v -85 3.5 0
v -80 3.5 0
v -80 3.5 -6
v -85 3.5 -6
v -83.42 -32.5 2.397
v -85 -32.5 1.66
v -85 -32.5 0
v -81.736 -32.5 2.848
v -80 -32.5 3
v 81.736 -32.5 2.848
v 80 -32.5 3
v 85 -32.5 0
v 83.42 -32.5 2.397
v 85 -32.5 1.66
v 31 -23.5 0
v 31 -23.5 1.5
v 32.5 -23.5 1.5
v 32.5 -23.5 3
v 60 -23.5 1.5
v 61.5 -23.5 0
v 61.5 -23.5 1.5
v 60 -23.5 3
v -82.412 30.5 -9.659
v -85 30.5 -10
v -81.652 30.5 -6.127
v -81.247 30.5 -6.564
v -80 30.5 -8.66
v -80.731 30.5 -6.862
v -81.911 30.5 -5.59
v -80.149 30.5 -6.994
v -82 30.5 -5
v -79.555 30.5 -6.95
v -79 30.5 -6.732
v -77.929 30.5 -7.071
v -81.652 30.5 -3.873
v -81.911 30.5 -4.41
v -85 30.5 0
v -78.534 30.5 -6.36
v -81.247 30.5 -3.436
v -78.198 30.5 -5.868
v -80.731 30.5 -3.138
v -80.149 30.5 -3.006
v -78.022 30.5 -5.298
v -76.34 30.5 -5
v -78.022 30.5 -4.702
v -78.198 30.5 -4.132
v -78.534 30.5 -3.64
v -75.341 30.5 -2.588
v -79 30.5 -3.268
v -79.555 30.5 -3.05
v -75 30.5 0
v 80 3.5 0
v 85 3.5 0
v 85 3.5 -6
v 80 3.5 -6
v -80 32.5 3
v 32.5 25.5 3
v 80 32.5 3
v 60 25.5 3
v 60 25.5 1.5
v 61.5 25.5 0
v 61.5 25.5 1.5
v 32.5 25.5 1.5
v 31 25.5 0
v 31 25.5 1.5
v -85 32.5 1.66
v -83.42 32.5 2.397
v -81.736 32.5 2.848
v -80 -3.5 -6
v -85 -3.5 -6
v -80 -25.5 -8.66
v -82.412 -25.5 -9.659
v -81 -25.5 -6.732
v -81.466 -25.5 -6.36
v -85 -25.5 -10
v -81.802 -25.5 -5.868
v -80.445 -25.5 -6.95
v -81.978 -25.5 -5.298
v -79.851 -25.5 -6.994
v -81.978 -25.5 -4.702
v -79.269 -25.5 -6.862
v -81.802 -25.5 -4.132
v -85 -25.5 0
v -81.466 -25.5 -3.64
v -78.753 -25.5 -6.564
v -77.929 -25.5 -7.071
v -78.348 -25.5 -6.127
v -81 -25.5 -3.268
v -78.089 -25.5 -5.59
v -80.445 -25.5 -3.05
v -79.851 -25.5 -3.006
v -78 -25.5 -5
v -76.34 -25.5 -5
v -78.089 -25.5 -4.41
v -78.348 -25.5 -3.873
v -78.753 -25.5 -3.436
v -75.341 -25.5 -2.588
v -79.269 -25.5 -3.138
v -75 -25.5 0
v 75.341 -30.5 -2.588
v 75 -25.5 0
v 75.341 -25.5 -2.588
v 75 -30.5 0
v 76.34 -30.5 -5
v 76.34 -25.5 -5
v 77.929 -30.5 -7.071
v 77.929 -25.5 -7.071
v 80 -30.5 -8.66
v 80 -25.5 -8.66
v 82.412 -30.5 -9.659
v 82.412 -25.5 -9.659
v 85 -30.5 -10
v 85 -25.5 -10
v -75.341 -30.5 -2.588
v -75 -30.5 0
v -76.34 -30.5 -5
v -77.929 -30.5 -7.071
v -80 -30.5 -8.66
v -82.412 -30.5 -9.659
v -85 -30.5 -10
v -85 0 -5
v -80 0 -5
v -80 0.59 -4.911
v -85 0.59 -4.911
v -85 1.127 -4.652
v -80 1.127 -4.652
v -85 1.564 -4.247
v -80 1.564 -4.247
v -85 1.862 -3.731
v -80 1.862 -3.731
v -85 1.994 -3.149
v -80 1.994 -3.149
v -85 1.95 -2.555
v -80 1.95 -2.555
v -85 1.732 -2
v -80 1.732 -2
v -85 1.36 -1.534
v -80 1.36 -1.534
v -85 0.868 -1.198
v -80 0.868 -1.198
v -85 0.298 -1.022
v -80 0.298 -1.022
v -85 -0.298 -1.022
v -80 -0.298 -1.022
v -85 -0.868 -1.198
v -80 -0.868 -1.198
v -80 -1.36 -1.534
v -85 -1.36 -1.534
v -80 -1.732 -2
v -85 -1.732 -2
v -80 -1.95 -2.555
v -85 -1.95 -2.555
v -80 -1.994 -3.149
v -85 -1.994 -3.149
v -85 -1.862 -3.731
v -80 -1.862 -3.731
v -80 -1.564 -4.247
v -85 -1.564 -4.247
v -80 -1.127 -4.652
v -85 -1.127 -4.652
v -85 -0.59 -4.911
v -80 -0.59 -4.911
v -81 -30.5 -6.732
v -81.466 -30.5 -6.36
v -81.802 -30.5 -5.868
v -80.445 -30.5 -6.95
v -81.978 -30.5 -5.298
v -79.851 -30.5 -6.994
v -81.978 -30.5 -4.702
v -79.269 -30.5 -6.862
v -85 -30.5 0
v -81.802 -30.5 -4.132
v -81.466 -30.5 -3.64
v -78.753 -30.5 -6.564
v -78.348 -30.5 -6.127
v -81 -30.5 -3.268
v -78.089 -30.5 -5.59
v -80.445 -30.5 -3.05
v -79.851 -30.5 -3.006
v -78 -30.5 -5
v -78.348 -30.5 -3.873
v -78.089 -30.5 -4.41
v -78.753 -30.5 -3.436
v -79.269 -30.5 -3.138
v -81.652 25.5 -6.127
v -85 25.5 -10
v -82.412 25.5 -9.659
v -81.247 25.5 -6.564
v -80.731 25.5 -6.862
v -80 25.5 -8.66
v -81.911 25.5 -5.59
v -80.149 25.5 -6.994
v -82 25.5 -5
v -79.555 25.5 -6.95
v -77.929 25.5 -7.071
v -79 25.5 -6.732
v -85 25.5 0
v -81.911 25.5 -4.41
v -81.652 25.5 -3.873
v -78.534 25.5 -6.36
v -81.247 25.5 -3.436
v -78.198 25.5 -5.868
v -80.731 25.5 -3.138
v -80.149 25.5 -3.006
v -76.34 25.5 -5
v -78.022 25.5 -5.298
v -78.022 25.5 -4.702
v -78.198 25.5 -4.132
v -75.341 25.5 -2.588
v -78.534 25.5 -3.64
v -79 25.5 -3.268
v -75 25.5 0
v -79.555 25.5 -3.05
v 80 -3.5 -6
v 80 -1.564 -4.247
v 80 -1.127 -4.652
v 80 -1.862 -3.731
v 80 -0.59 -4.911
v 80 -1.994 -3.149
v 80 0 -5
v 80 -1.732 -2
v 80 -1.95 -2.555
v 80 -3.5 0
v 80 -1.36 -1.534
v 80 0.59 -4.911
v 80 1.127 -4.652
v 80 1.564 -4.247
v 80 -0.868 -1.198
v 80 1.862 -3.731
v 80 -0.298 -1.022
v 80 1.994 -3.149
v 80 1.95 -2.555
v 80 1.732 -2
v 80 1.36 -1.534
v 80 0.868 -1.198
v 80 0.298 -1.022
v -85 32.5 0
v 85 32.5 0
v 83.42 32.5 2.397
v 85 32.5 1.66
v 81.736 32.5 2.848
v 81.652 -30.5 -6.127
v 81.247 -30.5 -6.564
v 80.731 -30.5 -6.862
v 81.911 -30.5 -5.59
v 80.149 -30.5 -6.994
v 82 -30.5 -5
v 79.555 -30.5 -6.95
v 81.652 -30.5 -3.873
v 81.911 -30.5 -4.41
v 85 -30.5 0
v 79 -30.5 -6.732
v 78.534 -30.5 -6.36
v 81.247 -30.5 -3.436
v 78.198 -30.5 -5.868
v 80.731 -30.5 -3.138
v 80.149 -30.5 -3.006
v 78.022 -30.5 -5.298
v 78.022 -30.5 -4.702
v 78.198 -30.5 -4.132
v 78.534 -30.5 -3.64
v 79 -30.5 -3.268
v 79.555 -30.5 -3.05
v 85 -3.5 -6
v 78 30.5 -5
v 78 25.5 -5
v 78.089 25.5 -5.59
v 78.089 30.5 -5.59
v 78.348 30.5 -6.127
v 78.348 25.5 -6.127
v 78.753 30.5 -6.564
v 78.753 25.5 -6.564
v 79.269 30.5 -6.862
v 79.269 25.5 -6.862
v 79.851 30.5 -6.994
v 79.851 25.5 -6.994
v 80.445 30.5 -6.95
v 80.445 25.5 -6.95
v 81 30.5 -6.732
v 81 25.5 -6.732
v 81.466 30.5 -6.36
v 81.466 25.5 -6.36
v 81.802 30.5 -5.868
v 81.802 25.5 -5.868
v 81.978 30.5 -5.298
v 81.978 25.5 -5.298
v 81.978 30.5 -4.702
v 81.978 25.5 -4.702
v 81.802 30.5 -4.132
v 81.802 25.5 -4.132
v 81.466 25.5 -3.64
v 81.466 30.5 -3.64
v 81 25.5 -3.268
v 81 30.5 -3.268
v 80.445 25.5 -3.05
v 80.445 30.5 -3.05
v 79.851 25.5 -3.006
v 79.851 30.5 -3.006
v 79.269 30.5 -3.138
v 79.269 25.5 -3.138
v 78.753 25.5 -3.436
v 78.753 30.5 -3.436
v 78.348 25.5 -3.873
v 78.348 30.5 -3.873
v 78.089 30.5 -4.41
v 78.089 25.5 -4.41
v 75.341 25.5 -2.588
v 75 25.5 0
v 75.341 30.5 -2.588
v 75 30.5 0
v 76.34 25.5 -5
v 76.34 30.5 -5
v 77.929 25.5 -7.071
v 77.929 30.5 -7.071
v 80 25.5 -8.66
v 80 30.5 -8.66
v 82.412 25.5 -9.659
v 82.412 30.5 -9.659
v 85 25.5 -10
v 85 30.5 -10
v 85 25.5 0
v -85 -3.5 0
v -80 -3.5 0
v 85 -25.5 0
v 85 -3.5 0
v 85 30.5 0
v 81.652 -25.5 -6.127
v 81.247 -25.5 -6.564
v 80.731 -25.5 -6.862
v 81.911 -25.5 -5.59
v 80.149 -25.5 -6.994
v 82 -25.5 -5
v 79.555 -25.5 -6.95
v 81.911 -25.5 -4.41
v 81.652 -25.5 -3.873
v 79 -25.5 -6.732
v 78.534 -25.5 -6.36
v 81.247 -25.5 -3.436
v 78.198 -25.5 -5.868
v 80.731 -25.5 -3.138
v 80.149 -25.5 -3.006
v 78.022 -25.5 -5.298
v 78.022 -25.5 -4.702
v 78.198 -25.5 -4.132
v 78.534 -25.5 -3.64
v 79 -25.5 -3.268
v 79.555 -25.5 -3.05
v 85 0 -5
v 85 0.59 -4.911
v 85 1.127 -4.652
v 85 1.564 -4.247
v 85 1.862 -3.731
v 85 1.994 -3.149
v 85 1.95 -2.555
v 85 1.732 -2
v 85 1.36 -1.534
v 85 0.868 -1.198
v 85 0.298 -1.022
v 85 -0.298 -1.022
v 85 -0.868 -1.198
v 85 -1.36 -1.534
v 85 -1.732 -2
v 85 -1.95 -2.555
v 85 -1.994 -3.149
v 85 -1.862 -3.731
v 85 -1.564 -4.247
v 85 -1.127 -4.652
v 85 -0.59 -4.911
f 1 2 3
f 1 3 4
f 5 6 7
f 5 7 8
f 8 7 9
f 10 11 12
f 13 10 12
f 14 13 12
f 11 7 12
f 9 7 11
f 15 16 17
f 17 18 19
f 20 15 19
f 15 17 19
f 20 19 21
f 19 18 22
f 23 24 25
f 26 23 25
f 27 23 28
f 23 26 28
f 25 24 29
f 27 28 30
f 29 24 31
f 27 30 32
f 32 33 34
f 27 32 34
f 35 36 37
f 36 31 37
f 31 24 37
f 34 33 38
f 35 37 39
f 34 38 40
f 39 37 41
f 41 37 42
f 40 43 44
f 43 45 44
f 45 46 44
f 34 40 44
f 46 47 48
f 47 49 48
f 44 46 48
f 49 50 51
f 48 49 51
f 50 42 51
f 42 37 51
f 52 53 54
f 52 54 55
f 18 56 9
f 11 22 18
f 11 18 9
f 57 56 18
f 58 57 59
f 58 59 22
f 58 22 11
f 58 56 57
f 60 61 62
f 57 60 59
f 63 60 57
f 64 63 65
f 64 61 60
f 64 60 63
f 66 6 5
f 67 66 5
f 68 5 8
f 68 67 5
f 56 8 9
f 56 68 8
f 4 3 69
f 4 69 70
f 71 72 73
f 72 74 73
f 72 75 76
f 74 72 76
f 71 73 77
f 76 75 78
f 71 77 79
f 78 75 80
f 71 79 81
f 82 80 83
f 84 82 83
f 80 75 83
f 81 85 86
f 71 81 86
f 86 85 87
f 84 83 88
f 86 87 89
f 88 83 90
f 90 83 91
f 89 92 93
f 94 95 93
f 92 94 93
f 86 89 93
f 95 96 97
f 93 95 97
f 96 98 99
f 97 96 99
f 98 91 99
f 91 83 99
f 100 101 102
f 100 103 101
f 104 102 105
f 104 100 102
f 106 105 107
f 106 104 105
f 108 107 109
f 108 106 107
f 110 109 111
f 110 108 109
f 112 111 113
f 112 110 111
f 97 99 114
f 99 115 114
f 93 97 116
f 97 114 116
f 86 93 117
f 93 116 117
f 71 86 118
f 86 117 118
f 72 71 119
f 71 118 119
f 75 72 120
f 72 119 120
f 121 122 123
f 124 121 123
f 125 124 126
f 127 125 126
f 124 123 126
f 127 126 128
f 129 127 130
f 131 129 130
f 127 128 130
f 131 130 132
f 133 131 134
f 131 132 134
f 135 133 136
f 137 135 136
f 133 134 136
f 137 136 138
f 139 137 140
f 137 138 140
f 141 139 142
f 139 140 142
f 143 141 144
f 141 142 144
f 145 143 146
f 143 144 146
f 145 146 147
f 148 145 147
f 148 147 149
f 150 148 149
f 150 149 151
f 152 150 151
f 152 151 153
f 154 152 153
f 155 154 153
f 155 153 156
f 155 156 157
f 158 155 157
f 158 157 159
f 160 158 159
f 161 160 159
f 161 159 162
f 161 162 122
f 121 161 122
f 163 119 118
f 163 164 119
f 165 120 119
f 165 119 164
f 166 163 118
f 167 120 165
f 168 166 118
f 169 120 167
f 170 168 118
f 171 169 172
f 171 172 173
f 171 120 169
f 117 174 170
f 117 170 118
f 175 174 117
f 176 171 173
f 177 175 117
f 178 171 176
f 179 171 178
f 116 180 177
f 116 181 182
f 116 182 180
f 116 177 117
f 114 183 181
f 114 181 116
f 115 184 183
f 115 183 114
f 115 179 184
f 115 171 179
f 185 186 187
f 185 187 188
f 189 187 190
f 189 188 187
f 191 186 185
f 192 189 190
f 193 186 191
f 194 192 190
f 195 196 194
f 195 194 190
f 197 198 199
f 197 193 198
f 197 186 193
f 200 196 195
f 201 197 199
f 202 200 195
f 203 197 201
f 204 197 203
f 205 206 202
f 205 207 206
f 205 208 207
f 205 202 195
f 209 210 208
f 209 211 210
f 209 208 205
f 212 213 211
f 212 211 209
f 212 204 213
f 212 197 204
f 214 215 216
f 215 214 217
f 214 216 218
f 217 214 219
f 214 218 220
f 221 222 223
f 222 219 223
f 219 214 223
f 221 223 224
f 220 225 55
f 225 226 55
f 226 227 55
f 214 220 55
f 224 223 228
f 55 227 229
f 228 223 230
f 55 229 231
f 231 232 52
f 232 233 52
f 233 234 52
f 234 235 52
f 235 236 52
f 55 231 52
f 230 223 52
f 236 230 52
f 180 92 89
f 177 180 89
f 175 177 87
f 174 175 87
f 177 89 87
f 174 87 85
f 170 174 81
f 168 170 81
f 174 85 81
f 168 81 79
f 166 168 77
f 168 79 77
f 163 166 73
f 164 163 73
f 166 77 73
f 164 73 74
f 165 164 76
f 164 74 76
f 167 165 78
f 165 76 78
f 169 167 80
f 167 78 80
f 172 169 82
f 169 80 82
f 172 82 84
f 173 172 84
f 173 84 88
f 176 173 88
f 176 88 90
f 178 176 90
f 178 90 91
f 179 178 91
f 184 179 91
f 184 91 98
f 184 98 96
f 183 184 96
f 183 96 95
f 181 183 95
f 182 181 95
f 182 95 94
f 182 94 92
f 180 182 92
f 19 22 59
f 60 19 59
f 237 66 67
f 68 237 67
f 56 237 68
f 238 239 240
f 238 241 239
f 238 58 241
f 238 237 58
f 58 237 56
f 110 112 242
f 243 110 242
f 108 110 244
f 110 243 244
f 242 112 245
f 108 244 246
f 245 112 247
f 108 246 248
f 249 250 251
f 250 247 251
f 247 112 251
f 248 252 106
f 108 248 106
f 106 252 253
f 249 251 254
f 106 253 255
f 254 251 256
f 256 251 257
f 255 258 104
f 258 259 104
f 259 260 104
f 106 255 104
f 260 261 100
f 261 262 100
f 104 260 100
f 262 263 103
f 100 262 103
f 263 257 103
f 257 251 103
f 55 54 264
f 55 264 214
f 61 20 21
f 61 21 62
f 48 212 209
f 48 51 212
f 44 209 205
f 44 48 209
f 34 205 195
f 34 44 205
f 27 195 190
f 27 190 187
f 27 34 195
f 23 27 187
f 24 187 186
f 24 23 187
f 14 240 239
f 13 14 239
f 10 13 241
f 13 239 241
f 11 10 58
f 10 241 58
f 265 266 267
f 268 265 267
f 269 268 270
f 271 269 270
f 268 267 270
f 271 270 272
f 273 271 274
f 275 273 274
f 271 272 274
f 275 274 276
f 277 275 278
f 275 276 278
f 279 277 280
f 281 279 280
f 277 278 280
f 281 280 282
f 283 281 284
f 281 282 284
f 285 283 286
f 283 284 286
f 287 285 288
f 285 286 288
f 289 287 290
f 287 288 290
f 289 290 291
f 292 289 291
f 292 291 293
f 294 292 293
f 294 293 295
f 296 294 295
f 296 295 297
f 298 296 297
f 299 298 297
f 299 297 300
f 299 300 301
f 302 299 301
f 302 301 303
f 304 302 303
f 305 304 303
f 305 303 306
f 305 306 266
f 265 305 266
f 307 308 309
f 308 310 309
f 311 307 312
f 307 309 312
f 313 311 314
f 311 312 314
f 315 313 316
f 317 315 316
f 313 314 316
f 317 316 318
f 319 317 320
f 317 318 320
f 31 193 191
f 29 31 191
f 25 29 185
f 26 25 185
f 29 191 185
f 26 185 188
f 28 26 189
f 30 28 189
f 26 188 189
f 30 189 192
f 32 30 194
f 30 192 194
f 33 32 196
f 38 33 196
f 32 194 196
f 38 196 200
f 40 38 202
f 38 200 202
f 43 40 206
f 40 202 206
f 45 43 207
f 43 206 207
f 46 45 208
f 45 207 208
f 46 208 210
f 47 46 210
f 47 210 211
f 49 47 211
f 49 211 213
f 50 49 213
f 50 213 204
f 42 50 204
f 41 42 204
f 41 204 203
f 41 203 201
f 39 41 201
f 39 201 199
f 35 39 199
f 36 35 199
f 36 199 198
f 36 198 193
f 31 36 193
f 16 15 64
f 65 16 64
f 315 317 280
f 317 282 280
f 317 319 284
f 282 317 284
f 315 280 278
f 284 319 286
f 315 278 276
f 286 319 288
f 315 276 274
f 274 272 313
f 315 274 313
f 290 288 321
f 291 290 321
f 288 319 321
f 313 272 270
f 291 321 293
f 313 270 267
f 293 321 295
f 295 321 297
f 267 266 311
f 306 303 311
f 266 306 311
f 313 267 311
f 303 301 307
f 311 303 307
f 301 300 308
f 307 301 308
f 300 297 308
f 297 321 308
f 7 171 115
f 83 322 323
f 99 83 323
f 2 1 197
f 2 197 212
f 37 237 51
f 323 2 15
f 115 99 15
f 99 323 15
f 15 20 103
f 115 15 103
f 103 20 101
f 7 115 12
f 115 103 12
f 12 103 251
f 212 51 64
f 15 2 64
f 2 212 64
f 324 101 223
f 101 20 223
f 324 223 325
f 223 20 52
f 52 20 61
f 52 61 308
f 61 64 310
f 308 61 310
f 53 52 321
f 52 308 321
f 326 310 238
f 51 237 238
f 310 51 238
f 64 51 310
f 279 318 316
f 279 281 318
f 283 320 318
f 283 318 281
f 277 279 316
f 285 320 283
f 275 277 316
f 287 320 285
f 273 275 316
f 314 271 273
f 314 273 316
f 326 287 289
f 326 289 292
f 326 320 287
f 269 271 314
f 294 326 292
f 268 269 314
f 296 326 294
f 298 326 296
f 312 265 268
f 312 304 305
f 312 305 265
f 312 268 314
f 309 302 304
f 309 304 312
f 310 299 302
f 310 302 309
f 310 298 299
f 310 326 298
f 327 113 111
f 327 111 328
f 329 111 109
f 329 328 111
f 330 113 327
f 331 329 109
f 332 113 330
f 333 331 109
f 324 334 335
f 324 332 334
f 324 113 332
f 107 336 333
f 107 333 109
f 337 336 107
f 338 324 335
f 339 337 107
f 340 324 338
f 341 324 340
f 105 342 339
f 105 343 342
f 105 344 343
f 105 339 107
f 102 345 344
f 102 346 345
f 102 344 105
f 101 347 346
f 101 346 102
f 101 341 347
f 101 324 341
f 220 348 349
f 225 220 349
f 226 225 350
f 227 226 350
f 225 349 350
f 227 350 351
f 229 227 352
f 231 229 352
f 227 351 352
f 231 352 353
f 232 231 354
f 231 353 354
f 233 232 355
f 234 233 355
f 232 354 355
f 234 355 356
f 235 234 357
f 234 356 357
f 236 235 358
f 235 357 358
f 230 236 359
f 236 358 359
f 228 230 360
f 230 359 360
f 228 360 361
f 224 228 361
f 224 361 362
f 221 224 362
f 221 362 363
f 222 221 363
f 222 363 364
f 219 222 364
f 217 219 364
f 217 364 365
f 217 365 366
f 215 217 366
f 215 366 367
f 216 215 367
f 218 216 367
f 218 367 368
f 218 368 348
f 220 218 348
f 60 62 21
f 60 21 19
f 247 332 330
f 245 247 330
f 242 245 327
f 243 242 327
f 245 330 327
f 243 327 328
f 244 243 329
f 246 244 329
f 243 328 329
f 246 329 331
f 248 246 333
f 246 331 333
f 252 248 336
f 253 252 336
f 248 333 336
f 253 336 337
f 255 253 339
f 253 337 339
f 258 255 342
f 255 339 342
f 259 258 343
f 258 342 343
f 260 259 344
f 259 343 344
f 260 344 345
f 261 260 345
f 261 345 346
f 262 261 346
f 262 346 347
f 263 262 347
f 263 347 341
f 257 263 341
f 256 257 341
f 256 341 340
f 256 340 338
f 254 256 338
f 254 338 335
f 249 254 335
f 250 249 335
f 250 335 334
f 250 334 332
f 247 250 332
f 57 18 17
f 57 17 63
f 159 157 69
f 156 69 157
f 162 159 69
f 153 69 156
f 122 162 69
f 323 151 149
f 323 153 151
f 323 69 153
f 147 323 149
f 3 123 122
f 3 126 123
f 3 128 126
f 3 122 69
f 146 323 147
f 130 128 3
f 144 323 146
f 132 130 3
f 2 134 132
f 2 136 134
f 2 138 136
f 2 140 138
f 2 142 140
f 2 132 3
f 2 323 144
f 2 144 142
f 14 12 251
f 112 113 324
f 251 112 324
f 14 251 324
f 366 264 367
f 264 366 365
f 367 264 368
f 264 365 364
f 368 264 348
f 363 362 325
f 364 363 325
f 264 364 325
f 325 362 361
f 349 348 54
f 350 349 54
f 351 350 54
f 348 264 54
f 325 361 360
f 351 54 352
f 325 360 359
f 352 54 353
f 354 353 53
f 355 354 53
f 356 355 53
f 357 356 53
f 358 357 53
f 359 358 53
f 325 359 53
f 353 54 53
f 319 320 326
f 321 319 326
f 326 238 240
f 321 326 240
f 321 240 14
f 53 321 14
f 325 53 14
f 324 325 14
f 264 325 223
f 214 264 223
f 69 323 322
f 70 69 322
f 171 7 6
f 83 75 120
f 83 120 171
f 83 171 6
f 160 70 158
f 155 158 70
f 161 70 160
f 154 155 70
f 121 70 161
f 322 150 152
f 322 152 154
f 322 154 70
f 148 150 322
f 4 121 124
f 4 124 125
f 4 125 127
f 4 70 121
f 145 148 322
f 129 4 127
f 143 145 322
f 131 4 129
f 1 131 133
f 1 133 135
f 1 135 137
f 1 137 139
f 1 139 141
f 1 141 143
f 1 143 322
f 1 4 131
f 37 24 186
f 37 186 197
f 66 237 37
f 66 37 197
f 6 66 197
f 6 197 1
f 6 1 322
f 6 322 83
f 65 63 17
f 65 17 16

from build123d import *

# Parameters (mm, degrees)
SKIZZE1_W                                  = 180
SKIZZE1_H                                  = 65
AUFSATZ_LINEAR_AUSTRAGEN1_DEPTH            = 3
SKIZZE3_W                                  = 5
SKIZZE3_H                                  = 7
AUFSATZ_LINEAR_AUSTRAGEN2_DEPTH            = 6
F_4_0_4_DURCHMESSER_BOHRUNG1_D             = 4
SCHNITT_LINEAR_AUSTRAGEN1_DEPTH            = 112.180034179
SKIZZE7_W                                  = 27.5
SKIZZE7_H                                  = 49
SCHNITT_LINEAR_AUSTRAGEN2_DEPTH            = 92.445338864
SKIZZE8_W                                  = 10
SKIZZE8_H                                  = 5
AUFSATZ_LINEAR_AUSTRAGEN3_DEPTH            = 10
SPIEGELN1_AT_THE_SECOND_PLANE_COPY_1_SKE_W = 10
SPIEGELN1_AT_THE_SECOND_PLANE_COPY_1_SKE_H = 5
SPIEGELN1_AT_THE_SECOND_PLANE_COPY_1_DEPTH = 10
VERRUNDUNG1_R                              = 10
F_4_0_4_DURCHMESSER_BOHRUNG2_D             = 4
F_4_0_4_DURCHMESSER_BOHRUNG2_DEPTH         = 5
F_4_0_4_DURCHMESSER_BOHRUNG3_D             = 4
F_4_0_4_DURCHMESSER_BOHRUNG3_DEPTH         = 5
SKIZZE13_W                                 = 30.5
SKIZZE13_H                                 = 49
SCHNITT_LINEAR_AUSTRAGEN4_DEPTH            = 1.5


with BuildPart() as part:
    # Skizze1 → Aufsatz-Linear austragen1 (new body)
    with BuildSketch(Plane.XY):
        Rectangle(SKIZZE1_W, SKIZZE1_H)
    extrude(amount=AUFSATZ_LINEAR_AUSTRAGEN1_DEPTH)

    # Skizze3 → Aufsatz-Linear austragen2 (add)
    with BuildSketch(Plane(origin=(0, 0, 0), x_dir=(-1, 0, 0), z_dir=(0, 0, -1))):
        with Locations((-82.5, 0)):
            Rectangle(SKIZZE3_W, SKIZZE3_H)
        with Locations((82.5, 0)):
            Rectangle(SKIZZE3_W, SKIZZE3_H)
    extrude(amount=AUFSATZ_LINEAR_AUSTRAGEN2_DEPTH)

    # Ø4.0 (4) Durchmesser Bohrung1 (through all)
    with Locations(Plane.ZY.offset(85)):
        with Locations((-3, 0)):
            Hole(F_4_0_4_DURCHMESSER_BOHRUNG1_D / 2)

    # Skizze6 → Schnitt-Linear austragen1 (cut, through all)
    with BuildSketch(Plane(origin=(0, 32.5, 0), x_dir=(1, 0, 0), z_dir=(0, 1, 0))):
        with BuildLine():
            Line((-80, -3), (-90, -3))
            Line((-90, -3), (-90, 0))
            Line((-90, 0), (-85, 0))
            Line((-85, 0), (-85, -1.660254038))
            ThreePointArc((-85, -1.660254038), (-82.588190451, -2.659258263), (-80, -3))
        make_face()
        with BuildLine():
            Line((80, -3), (90, -3))
            Line((90, -3), (90, 0))
            Line((90, 0), (85, 0))
            Line((85, 0), (85, -1.660254038))
            ThreePointArc((85, -1.660254038), (82.588190451, -2.659258263), (80, -3))
        make_face()
    extrude(amount=-SCHNITT_LINEAR_AUSTRAGEN1_DEPTH, mode=Mode.SUBTRACT)

    # Skizze7 → Schnitt-Linear austragen2 (cut, through all)
    with BuildSketch(Plane.XY.offset(3)):
        with Locations((46.25, 1)):
            Rectangle(SKIZZE7_W, SKIZZE7_H)
    extrude(amount=-SCHNITT_LINEAR_AUSTRAGEN2_DEPTH, mode=Mode.SUBTRACT)

    # Skizze8 → Aufsatz-Linear austragen3 (add)
    with BuildSketch(Plane(origin=(0, 0, 0), x_dir=(-1, 0, 0), z_dir=(0, 0, -1))):
        with Locations((-80, 28)):
            Rectangle(SKIZZE8_W, SKIZZE8_H)
    aufsatz_linear_austragen3 = extrude(amount=AUFSATZ_LINEAR_AUSTRAGEN3_DEPTH)

    # Spiegeln1: Aufsatz-Linear austragen3 across plane
    add(aufsatz_linear_austragen3.mirror(Plane(origin=(0, 0, 0), x_dir=(0, 0, 1), z_dir=(1, 0, 0))))

    # Spiegeln1 at the second plane: Aufsatz-Linear austragen3 across plane
    add(aufsatz_linear_austragen3.mirror(Plane.ZX))

    # Spiegeln1 at the second plane copy 1 ske → Spiegeln1 at the second plane copy 1 (add)
    with BuildSketch(Plane(origin=(0, 0, 0), x_dir=(1, 0, 0), z_dir=(0, 0, -1))):
        with Locations((-80, 28)):
            Rectangle(SPIEGELN1_AT_THE_SECOND_PLANE_COPY_1_SKE_W, SPIEGELN1_AT_THE_SECOND_PLANE_COPY_1_SKE_H)
    extrude(amount=SPIEGELN1_AT_THE_SECOND_PLANE_COPY_1_DEPTH)

    # Verrundung1
    verrundung1_edges = [part.edges().sort_by_distance(p)[0] for p in [
        (75, 28, -10),
        (75, -28, -10),
        (-75, 28, -10),
        (-75, -28, -10),
    ]]
    fillet(verrundung1_edges, radius=VERRUNDUNG1_R - 0.0001)  # a hair under: the kernel refuses the full size

    # Ø4.0 (4) Durchmesser Bohrung2
    with Locations(Plane(origin=(0, 30.5, 0), x_dir=(1, 0, 0), z_dir=(0, 1, 0))):
        with Locations((-80, 5), (80, 5)):
            Hole(F_4_0_4_DURCHMESSER_BOHRUNG2_D / 2, depth=F_4_0_4_DURCHMESSER_BOHRUNG2_DEPTH)

    # Ø4.0 (4) Durchmesser Bohrung3
    with Locations(Plane(origin=(0, -30.5, 0), x_dir=(-1, 0, 0), z_dir=(0, -1, 0))):
        with Locations((-80, 5), (80, 5)):
            Hole(F_4_0_4_DURCHMESSER_BOHRUNG3_D / 2, depth=F_4_0_4_DURCHMESSER_BOHRUNG3_DEPTH)

    # Skizze13 → Schnitt-Linear austragen4 (cut)
    with BuildSketch(Plane(origin=(0, 0, 0), x_dir=(-1, 0, 0), z_dir=(0, 0, -1))):
        with Locations((-46.25, 1)):
            Rectangle(SKIZZE13_W, SKIZZE13_H)
    extrude(amount=-SCHNITT_LINEAR_AUSTRAGEN4_DEPTH, mode=Mode.SUBTRACT)


solid = part.part
